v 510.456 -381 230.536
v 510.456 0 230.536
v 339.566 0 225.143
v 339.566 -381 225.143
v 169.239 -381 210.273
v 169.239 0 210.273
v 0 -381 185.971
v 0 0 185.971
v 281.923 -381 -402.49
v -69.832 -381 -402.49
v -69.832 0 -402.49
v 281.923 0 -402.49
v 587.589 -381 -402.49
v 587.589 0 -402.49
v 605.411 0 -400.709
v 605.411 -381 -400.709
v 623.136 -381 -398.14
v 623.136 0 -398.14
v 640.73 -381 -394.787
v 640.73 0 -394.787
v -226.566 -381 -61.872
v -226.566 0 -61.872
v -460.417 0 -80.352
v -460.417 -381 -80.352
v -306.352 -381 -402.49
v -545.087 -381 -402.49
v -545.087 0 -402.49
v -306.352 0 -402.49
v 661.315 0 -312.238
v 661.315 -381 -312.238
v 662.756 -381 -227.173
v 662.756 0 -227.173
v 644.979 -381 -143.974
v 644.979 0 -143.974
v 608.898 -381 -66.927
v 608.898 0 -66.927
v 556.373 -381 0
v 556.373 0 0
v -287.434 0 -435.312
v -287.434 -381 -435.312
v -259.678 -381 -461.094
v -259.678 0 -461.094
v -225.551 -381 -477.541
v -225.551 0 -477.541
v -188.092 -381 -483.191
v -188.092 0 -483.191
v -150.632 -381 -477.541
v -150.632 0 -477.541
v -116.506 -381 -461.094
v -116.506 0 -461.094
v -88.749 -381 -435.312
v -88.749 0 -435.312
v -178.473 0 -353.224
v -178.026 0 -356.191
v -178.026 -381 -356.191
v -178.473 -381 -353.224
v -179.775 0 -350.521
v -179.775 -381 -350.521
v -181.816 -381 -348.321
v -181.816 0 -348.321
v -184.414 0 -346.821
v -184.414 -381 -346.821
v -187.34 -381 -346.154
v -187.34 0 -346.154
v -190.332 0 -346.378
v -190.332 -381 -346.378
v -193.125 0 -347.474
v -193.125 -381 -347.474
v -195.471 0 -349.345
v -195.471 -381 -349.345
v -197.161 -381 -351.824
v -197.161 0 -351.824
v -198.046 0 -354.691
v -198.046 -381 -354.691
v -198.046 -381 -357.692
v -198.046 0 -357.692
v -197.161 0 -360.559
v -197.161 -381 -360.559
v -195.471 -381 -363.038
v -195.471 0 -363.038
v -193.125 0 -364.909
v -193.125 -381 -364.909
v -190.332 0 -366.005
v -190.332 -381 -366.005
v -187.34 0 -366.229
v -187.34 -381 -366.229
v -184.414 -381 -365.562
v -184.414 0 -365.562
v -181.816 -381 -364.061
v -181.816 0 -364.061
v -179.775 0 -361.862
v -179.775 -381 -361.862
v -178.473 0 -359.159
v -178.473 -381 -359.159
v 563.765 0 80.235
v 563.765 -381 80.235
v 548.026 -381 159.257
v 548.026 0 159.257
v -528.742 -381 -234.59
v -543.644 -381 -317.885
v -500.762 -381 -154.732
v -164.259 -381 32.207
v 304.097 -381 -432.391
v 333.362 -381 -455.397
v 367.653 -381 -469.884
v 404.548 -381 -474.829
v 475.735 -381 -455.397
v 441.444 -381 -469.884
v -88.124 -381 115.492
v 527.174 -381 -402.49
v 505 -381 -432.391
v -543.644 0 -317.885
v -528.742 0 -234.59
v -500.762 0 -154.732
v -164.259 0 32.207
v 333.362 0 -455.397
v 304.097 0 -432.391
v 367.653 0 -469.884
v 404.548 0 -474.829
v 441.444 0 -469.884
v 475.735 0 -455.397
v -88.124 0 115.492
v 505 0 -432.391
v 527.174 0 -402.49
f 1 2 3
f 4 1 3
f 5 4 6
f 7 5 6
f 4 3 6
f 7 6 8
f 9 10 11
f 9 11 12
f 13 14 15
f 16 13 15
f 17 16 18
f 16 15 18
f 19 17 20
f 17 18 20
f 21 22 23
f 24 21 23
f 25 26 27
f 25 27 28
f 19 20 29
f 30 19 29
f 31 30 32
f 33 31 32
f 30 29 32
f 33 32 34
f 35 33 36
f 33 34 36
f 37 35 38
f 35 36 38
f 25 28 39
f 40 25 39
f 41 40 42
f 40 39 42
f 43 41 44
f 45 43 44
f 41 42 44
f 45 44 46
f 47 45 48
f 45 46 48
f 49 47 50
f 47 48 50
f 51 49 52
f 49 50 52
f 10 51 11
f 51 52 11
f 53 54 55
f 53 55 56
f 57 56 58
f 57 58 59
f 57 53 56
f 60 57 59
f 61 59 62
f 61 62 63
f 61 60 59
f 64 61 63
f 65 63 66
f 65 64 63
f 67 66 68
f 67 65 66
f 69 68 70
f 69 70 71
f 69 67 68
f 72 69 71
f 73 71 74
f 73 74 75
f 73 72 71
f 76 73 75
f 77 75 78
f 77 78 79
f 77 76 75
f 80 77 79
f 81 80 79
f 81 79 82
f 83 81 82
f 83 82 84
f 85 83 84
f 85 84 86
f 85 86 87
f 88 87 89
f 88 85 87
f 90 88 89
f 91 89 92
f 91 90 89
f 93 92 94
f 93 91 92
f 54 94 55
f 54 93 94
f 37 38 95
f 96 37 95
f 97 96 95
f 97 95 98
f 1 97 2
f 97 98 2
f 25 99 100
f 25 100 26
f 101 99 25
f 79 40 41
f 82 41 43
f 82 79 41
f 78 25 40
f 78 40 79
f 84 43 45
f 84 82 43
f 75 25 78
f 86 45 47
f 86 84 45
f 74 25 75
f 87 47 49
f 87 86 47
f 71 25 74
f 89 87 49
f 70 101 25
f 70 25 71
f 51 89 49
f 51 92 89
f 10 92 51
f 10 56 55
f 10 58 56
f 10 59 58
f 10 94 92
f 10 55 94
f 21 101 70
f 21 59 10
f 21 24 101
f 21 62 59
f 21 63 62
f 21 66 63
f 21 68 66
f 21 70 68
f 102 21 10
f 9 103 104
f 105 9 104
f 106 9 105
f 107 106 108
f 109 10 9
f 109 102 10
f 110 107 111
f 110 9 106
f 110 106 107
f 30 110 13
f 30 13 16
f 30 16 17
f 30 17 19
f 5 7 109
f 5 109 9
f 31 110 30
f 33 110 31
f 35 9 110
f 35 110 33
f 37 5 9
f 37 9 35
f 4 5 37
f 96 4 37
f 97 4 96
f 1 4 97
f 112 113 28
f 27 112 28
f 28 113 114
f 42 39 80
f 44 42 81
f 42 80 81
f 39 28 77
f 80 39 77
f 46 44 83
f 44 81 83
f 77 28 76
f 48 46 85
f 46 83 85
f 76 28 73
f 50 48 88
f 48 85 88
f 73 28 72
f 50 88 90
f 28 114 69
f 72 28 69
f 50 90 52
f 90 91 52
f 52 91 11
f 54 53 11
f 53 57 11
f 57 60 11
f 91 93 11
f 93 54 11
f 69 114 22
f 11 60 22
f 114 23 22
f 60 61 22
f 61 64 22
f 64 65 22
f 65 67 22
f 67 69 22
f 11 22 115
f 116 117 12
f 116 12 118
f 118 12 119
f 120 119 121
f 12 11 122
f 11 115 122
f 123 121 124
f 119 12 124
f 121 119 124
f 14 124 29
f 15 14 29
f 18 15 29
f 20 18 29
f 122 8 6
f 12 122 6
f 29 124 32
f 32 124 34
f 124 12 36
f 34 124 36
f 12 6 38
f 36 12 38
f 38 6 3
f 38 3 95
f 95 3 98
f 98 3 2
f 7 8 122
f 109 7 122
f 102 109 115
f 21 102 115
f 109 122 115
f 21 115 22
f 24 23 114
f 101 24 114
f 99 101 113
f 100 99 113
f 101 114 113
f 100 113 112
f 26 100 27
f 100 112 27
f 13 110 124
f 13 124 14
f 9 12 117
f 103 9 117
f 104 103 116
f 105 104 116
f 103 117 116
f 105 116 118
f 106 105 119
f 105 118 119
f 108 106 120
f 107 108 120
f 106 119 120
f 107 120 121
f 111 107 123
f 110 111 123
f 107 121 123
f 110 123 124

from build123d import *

# Parameters (mm, degrees)
F0_R     = 10.0661107962
F1_DEPTH = 381


with BuildPart() as f1:
    # F0 (on Front) → F1 (new body)
    with BuildSketch(Plane.XZ):
        with BuildLine():
            ThreePointArc((-460.4171146545, -80.3520751223), (-528.7422428891, -234.5899299241), (-545.0866186853, -402.490199078))
            Line((-545.0866186853, -402.490199078), (-306.3518632039, -402.490199078))
            ThreePointArc((-306.3518632039, -402.490199078), (-211.6500630521, -231.3956211083), (-61.0918521756, -356.1914972432))
            ThreePointArc((-61.0918521756, -356.1914972432), (-63.2959760406, -379.7497081198), (-69.8318411473, -402.490199078))
            Line((-69.8318411473, -402.490199078), (281.923010605, -402.490199078))
            ThreePointArc((281.923010605, -402.490199078), (369.5574089397, -199.0626294837), (544.651634751, -334.7260951996))
            ThreePointArc((544.651634751, -334.7260951996), (540.2117829098, -369.7170034539), (527.173623783, -402.490199078))
            Line((527.173623783, -402.490199078), (587.5886353005, -402.490199078))
            ThreePointArc((587.5886353005, -402.490199078), (614.2875363688, -399.5230484268), (640.7299934295, -394.7868299108))
            ThreePointArc((640.7299934295, -394.7868299108), (656.2355333133, -185.0675662335), (556.3726911105, 0))
            Line((556.3726911105, 0), (-226.5663393053, -61.8719576371))
            Line((-226.5663393053, -61.8719576371), (-409.496628924, -76.3280706806))
            Line((-409.496628924, -76.3280706806), (-460.4171146545, -80.3520751223))
        make_face()
        with BuildLine():
            ThreePointArc((0, 185.9708741245), (-127.8124548077, 75.3314520254), (-226.5663393053, -61.8719576371))
            Line((-226.5663393053, -61.8719576371), (556.3726911105, 0))
            ThreePointArc((556.3726911105, 0), (558.7501920915, 120.3142873349), (510.4560028632, 230.5361160923))
            ThreePointArc((510.4560028632, 230.5361160923), (254.2993354525, 218.8905544569), (0, 185.9708741245))
        make_face()
        with BuildLine():
            ThreePointArc((-61.0918521756, -356.1914972432), (-211.6500630521, -231.3956211083), (-306.3518632039, -402.490199078))
            Line((-306.3518632039, -402.490199078), (-69.8318411473, -402.490199078))
            ThreePointArc((-69.8318411473, -402.490199078), (-63.2959760406, -379.7497081198), (-61.0918521756, -356.1914972432))
        make_face()
        with Locations((-188.0918521756, -356.1914972432)):
            Circle(F0_R, mode=Mode.SUBTRACT)
        with BuildLine():
            Line((-69.8318411473, -402.490199078), (-306.3518632039, -402.490199078))
            ThreePointArc((-306.3518632039, -402.490199078), (-188.0918521756, -483.1914972432), (-69.8318411473, -402.490199078))
        make_face()
        with BuildLine():
            ThreePointArc((544.651634751, -334.7260951996), (369.5574089397, -199.0626294837), (281.923010605, -402.490199078))
            Line((281.923010605, -402.490199078), (527.173623783, -402.490199078))
            ThreePointArc((527.173623783, -402.490199078), (540.2117829098, -369.7170034539), (544.651634751, -334.7260951996))
        make_face()
        with BuildLine():
            Line((527.173623783, -402.490199078), (281.923010605, -402.490199078))
            ThreePointArc((281.923010605, -402.490199078), (404.548317194, -474.8294127566), (527.173623783, -402.490199078))
        make_face()
    extrude(amount=F1_DEPTH)


solid = f1.part
